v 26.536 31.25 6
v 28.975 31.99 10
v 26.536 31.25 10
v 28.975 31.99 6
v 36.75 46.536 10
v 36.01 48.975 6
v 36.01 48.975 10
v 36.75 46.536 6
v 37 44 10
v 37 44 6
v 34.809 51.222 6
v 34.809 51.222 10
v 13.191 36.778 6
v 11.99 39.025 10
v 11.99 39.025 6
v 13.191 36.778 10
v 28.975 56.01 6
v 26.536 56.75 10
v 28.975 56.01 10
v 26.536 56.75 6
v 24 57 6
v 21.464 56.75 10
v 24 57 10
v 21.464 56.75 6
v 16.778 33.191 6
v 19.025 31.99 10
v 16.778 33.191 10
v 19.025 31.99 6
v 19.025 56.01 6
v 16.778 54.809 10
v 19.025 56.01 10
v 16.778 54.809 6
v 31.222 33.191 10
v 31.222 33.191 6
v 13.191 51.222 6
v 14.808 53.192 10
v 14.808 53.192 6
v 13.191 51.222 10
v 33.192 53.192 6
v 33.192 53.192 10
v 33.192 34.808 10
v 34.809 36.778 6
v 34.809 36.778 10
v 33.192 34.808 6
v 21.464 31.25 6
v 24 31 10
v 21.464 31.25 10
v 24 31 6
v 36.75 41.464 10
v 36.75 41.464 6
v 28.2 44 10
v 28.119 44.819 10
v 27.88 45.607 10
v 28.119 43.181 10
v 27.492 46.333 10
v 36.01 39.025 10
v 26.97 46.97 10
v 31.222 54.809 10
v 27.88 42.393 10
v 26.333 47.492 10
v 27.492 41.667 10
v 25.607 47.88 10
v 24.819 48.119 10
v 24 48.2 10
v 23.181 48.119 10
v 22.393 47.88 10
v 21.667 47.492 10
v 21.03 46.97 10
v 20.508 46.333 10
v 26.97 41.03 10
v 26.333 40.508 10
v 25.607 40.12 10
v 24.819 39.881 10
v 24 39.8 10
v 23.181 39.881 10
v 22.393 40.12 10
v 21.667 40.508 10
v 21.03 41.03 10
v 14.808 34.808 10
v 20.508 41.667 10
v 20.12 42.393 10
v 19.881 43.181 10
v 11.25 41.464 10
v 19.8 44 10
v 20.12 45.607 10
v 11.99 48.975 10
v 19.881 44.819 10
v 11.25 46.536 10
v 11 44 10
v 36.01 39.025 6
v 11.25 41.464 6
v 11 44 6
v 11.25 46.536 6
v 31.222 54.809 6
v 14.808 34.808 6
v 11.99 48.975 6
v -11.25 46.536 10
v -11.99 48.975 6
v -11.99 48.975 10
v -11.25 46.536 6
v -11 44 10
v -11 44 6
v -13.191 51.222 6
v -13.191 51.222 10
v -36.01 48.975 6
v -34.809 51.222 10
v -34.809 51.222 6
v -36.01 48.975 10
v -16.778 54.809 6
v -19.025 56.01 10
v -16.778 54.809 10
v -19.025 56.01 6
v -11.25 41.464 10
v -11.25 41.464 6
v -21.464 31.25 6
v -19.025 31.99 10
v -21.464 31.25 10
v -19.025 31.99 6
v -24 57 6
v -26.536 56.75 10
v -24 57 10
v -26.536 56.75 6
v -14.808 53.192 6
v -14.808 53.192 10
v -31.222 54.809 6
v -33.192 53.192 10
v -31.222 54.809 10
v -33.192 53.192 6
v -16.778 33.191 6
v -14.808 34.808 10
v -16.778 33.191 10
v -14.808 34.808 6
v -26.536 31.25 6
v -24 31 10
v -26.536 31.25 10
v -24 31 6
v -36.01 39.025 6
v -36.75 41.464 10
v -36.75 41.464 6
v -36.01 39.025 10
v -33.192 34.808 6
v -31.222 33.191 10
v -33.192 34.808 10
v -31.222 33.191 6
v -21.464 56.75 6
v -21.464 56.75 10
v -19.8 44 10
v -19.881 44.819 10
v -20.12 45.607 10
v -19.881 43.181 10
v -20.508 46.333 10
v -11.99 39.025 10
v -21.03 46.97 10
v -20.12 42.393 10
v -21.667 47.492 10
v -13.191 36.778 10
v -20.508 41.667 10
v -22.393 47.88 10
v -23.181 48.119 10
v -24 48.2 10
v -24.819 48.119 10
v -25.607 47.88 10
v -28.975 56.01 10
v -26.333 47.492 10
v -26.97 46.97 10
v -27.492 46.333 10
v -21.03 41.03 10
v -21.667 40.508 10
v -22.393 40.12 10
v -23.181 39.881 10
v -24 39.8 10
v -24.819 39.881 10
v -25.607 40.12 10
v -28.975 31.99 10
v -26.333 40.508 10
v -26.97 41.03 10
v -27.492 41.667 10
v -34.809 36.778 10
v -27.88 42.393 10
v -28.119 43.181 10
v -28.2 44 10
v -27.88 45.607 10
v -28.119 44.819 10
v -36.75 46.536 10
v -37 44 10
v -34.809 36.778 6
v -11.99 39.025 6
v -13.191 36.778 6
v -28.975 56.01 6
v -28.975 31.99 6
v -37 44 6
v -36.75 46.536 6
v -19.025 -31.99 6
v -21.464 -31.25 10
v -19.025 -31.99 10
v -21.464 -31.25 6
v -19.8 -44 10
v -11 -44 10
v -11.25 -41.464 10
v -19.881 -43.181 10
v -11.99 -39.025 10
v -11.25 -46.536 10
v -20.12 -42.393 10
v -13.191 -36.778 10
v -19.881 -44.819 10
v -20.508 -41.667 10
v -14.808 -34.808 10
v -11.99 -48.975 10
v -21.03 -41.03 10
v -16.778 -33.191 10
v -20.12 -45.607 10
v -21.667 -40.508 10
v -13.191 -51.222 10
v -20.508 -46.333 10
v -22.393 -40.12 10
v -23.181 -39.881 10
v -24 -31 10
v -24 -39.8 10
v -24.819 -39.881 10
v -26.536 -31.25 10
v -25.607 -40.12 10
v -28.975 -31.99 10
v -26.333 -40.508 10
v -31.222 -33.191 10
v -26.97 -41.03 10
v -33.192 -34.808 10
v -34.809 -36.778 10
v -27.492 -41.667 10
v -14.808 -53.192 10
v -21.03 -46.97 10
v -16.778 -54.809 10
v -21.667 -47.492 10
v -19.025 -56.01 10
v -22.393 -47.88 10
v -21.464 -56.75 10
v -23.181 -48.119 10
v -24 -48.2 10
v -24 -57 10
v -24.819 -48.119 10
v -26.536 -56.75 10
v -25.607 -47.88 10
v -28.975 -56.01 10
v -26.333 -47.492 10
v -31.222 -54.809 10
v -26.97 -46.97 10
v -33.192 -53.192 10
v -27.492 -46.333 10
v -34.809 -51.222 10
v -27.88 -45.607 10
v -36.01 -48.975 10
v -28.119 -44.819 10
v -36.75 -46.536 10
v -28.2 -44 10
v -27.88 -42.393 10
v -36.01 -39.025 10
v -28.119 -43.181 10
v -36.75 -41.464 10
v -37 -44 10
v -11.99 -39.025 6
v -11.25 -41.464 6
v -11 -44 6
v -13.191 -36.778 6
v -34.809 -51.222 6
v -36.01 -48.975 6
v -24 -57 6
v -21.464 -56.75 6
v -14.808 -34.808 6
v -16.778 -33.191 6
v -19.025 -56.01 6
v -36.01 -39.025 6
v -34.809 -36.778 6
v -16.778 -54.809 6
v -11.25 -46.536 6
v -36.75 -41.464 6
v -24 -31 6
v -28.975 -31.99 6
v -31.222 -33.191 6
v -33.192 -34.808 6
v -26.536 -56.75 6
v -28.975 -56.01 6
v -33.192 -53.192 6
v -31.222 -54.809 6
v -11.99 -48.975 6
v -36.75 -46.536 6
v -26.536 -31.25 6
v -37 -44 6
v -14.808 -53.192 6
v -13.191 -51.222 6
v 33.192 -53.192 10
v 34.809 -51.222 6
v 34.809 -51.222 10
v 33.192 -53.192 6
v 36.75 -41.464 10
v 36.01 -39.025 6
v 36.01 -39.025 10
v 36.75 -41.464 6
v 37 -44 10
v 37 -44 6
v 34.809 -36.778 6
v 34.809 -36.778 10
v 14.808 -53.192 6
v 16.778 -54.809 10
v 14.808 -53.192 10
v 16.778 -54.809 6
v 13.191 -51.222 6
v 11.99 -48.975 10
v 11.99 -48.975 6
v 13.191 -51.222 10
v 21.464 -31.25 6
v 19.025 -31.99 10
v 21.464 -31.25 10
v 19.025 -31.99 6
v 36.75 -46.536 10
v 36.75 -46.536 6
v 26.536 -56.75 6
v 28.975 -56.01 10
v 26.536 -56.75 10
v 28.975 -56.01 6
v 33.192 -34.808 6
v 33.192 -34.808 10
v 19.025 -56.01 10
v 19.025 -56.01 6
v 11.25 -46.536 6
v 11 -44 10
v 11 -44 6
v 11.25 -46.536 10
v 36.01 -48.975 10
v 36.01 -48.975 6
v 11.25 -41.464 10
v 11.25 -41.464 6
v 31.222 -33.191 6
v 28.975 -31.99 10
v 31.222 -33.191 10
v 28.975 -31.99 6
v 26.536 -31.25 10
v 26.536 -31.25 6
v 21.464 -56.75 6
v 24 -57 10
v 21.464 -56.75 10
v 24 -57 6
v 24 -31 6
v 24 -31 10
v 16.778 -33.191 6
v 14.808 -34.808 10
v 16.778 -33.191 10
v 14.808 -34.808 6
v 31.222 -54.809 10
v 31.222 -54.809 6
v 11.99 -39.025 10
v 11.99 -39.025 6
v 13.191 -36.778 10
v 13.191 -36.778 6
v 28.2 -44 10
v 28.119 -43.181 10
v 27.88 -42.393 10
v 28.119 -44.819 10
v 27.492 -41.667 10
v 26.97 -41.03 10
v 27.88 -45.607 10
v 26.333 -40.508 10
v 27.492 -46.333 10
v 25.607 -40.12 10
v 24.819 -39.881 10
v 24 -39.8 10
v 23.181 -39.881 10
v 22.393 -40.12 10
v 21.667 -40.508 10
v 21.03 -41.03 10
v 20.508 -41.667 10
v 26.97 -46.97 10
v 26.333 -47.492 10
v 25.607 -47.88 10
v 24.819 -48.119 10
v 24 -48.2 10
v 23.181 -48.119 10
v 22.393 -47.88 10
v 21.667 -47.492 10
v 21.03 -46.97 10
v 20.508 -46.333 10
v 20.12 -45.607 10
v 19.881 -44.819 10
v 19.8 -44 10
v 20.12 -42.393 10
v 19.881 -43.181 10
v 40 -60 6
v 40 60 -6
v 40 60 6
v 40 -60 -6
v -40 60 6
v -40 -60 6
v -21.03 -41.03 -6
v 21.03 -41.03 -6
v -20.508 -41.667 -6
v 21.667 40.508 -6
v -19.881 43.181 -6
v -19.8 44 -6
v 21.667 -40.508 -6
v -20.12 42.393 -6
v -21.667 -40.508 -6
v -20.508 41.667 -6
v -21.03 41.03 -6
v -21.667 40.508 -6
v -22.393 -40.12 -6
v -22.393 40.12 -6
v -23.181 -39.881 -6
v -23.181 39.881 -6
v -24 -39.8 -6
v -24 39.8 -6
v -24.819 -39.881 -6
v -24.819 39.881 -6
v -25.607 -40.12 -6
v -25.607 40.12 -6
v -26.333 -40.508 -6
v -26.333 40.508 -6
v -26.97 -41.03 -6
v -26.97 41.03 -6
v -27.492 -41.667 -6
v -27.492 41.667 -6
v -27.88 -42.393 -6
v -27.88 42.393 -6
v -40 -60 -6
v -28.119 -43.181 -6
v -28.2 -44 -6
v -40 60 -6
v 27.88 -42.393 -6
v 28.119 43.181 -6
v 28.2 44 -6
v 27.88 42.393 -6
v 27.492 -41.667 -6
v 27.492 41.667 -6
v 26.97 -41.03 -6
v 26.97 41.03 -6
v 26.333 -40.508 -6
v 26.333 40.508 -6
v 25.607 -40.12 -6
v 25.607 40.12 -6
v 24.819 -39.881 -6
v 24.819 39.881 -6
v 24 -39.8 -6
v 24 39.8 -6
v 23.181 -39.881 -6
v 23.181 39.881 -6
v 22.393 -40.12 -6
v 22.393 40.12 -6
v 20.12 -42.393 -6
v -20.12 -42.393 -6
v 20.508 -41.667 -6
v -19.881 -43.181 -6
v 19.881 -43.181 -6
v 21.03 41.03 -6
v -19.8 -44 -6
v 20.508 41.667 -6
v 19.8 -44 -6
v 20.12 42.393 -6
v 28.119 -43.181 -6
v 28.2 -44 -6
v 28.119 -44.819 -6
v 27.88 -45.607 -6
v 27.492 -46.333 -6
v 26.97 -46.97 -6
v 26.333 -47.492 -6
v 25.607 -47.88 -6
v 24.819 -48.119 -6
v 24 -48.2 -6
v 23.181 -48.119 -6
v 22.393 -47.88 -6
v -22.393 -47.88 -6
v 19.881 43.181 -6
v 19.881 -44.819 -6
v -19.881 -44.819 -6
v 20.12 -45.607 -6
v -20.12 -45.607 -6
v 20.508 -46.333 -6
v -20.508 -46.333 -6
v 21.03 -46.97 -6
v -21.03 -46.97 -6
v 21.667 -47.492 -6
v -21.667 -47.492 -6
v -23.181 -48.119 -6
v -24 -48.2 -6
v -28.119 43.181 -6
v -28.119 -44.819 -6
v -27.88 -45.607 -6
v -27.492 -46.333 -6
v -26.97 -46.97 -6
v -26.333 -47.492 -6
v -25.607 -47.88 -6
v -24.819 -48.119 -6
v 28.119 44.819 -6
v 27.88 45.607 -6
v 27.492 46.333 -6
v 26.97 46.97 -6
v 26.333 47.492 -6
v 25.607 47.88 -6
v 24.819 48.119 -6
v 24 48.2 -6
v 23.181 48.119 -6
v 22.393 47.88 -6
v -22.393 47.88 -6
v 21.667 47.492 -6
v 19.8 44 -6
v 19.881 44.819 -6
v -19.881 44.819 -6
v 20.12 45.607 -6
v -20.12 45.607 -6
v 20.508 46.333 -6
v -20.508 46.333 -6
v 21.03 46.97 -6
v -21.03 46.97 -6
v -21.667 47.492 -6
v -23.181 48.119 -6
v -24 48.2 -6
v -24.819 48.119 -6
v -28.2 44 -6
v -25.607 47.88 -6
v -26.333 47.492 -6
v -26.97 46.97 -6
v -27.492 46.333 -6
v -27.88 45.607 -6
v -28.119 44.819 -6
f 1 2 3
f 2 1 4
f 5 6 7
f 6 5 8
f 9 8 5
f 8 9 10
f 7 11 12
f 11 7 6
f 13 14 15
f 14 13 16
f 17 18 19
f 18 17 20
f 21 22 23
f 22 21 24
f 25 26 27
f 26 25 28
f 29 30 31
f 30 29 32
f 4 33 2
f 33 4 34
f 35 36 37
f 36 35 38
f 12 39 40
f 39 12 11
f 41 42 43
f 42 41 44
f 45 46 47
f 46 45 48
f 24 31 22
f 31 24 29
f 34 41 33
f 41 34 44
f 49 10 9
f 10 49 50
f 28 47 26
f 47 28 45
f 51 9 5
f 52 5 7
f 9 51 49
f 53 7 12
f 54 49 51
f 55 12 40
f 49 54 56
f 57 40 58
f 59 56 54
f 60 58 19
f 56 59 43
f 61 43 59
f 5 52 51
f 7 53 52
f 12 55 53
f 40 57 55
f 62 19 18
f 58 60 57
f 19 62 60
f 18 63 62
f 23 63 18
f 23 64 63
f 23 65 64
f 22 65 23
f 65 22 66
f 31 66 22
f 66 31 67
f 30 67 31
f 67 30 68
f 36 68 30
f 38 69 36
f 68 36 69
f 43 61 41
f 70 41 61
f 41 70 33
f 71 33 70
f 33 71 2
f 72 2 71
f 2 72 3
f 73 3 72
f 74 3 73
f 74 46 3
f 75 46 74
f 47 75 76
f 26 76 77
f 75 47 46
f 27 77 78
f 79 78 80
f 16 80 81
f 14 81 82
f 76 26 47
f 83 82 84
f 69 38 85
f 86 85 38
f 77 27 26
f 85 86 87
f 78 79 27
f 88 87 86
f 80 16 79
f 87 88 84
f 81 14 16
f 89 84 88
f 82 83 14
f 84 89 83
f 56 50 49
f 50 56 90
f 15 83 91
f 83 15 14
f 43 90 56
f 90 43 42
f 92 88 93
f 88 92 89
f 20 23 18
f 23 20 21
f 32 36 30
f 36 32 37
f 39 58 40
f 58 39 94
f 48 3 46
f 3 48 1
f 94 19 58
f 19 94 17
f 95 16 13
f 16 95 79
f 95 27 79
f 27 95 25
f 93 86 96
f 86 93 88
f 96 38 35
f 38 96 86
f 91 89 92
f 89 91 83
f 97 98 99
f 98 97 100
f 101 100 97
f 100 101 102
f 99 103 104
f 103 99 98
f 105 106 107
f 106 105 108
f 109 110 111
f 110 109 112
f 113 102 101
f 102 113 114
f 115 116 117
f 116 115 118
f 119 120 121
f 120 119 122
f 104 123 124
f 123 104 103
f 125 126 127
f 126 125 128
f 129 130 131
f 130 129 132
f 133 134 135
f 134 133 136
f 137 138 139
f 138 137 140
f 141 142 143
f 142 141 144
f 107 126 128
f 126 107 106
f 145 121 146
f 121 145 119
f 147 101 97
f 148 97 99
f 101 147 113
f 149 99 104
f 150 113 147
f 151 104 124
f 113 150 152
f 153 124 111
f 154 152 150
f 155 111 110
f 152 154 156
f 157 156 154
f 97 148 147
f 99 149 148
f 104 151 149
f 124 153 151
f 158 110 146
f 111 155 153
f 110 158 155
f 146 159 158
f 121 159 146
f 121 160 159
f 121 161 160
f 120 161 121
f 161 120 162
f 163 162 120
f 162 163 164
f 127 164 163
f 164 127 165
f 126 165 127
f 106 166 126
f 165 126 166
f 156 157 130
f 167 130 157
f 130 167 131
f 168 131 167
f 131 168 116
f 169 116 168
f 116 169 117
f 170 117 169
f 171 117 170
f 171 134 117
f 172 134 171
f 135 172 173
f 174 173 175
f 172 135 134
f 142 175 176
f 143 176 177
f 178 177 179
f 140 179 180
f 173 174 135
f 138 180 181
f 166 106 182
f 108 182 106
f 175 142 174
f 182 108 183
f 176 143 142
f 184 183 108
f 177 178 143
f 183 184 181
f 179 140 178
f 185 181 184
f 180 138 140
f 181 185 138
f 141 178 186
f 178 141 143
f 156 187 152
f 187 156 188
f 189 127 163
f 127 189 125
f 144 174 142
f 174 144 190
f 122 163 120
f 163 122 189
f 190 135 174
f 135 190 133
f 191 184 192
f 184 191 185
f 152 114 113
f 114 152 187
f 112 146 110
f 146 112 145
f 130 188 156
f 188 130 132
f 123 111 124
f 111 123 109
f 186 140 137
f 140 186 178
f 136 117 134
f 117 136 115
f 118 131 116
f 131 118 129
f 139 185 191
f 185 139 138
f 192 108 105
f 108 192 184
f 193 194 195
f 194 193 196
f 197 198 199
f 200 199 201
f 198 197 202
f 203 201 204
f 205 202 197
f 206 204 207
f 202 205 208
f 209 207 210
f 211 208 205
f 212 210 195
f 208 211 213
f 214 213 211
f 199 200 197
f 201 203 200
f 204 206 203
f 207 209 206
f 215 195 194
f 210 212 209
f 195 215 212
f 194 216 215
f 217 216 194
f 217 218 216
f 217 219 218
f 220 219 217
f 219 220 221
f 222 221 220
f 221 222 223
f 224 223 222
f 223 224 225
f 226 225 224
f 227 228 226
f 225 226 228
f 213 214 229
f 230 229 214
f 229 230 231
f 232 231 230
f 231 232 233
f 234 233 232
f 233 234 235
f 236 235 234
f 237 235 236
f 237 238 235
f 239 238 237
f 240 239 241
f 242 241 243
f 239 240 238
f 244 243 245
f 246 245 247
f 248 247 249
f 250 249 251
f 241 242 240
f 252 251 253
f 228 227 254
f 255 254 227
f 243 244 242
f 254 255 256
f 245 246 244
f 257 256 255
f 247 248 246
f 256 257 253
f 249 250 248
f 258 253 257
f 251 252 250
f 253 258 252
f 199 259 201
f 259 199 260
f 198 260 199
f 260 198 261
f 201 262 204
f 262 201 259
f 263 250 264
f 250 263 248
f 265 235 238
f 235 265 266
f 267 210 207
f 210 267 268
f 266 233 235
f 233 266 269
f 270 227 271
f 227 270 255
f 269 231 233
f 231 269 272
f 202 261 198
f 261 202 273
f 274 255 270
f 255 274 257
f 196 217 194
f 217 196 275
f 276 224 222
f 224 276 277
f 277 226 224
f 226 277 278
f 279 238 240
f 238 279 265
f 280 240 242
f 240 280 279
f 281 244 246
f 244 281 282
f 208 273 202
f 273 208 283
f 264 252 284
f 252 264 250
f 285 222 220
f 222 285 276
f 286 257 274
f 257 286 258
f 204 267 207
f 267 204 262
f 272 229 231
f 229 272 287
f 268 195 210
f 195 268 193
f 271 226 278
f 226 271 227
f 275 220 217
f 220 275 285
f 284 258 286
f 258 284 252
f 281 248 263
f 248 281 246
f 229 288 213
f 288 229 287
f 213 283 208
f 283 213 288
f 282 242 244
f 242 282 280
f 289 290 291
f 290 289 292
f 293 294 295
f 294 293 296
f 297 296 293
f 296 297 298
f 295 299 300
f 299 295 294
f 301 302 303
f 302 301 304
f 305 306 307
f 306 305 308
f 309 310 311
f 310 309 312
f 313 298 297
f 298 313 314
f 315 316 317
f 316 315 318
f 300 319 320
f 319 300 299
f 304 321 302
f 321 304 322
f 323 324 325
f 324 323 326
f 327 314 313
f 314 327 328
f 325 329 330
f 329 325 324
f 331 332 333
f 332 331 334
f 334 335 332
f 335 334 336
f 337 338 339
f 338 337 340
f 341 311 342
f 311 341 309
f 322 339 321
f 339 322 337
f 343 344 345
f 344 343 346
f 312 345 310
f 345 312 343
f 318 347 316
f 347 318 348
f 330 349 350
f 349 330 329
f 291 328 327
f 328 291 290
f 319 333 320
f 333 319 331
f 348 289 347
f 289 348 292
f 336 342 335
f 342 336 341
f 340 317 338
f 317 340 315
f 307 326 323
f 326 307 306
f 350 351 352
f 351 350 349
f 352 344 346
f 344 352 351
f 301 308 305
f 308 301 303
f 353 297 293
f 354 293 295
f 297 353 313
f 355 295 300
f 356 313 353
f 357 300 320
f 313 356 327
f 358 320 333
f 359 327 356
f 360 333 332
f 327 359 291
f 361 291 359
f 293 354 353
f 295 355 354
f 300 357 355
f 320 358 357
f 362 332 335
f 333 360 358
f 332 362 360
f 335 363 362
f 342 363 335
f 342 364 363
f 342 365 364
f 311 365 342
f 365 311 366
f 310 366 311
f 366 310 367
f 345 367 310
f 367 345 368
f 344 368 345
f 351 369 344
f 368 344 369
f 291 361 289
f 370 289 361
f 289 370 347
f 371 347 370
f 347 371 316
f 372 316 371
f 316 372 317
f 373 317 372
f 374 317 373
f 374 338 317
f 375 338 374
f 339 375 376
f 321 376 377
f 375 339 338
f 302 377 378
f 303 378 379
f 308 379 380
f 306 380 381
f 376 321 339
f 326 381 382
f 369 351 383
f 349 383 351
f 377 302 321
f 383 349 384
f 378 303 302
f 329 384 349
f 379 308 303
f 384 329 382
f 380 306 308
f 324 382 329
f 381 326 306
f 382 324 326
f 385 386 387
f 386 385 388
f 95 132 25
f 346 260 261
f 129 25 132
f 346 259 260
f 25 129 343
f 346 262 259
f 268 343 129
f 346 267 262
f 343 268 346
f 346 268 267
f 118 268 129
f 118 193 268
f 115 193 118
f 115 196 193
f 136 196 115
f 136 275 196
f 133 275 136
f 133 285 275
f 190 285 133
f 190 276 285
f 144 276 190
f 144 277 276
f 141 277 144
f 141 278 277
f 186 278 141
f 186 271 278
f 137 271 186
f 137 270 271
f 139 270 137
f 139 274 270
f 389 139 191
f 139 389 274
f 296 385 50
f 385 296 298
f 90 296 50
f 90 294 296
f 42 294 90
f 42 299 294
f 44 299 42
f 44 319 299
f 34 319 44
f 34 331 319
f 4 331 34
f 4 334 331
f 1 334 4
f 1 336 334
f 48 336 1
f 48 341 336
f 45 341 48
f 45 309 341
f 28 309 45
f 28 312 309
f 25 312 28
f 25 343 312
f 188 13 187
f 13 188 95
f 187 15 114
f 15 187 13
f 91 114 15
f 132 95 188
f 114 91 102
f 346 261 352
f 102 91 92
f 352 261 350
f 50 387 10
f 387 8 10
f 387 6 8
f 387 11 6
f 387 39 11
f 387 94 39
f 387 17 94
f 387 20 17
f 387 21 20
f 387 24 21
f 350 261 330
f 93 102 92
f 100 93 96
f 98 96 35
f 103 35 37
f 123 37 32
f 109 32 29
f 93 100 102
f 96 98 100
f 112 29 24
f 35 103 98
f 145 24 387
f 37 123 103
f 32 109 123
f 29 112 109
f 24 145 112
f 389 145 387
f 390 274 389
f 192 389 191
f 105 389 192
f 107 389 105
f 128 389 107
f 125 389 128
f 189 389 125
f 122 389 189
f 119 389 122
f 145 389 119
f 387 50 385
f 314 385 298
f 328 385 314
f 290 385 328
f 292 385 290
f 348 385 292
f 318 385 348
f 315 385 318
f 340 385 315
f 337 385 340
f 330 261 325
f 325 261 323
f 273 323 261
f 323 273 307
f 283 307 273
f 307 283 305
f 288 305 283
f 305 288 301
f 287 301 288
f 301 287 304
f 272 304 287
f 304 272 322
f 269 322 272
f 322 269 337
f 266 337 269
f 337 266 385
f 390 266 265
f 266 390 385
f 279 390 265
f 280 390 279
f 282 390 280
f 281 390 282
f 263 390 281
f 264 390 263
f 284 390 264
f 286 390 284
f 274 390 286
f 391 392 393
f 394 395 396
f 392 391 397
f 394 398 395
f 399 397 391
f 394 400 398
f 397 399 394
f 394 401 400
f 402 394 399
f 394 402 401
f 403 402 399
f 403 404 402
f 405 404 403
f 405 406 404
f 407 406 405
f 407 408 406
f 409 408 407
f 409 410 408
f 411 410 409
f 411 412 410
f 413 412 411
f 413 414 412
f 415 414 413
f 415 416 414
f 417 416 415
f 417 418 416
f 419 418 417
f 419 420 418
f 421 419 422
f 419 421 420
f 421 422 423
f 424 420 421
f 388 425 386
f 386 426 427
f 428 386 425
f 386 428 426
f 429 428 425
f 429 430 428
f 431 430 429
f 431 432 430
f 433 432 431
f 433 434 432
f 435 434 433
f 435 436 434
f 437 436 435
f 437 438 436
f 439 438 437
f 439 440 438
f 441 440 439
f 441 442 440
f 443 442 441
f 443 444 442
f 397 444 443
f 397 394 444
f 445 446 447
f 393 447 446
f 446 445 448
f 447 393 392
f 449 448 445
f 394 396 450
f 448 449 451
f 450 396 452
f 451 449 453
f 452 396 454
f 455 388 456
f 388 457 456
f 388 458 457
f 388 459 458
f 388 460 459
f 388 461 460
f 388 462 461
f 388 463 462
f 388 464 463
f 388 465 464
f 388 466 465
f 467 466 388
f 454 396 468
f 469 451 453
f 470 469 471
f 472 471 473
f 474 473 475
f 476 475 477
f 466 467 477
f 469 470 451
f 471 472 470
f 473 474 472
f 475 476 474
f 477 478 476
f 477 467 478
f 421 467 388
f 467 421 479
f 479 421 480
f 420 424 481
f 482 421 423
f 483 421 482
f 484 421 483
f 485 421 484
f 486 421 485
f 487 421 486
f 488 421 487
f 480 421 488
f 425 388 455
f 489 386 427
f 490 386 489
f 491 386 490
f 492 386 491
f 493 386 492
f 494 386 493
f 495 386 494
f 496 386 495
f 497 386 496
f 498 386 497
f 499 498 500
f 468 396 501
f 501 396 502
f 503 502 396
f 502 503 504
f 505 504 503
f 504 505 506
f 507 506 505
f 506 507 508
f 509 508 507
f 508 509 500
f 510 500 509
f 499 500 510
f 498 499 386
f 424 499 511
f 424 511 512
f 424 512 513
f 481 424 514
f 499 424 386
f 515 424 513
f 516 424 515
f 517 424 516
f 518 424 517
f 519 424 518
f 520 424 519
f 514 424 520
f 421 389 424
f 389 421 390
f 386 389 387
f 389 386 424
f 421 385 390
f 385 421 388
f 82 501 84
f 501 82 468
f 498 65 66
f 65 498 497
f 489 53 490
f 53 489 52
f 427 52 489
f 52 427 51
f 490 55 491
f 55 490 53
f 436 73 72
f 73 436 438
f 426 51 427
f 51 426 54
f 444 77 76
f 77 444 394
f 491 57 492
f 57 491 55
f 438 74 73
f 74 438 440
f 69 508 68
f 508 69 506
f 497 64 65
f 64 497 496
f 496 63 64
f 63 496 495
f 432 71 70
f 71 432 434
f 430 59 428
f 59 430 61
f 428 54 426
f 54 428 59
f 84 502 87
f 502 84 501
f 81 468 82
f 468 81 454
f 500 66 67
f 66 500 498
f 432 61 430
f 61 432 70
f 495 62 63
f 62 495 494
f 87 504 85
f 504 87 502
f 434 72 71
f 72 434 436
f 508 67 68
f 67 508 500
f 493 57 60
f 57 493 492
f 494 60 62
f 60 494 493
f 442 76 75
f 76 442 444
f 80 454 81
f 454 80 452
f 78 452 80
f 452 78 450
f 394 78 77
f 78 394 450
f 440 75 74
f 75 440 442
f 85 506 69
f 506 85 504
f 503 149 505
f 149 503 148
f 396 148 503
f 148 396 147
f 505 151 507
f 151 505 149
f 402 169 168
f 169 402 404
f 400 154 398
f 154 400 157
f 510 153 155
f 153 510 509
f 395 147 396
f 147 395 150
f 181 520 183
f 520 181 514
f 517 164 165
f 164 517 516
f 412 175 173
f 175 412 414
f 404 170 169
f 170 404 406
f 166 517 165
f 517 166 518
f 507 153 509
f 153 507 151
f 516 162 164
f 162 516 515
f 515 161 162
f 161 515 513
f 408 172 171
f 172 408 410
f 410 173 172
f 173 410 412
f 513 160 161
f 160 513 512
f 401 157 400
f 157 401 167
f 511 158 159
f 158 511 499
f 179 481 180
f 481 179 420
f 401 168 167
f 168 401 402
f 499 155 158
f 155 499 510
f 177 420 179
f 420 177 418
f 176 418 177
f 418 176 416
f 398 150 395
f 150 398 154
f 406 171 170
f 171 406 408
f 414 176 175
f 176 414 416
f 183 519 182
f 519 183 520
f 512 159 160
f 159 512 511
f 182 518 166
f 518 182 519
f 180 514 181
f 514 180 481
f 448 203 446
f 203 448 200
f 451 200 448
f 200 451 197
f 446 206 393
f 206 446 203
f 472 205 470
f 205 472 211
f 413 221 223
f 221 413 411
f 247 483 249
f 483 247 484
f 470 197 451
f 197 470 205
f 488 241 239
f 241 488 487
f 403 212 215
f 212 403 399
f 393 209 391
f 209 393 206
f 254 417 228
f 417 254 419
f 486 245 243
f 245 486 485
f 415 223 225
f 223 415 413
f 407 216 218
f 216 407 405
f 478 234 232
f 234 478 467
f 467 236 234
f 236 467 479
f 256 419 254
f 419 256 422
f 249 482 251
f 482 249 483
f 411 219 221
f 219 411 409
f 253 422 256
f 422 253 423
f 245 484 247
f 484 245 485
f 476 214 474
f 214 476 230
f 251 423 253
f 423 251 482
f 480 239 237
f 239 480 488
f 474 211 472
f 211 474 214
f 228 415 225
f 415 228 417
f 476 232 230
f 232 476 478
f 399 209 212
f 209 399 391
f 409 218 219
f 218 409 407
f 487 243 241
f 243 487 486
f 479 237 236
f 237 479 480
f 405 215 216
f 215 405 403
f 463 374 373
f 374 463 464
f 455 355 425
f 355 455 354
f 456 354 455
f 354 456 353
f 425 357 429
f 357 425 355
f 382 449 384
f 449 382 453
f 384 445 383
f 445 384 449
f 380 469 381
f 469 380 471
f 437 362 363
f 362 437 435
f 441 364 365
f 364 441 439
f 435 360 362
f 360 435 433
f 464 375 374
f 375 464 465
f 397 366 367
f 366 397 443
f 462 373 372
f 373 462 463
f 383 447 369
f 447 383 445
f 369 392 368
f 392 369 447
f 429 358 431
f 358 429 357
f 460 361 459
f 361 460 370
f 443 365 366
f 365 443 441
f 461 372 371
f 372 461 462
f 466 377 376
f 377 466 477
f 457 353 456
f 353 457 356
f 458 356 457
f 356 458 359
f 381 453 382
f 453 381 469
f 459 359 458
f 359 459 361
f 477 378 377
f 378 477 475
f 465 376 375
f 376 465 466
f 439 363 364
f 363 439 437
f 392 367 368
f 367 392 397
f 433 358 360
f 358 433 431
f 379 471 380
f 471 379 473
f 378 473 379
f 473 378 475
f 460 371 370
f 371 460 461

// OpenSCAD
$fn = 32;

// ----------------------------------------------------------------------
// Anchor pads 80 x 120 x 16
// four corner bosses with anchor holes
// ----------------------------------------------------------------------

// --- parameters (mm) ---
plate = [80, 120, 12];  // base plate size (x, y, z)
pads = 4;               // boss count, one per corner
edge = 16;              // boss centre offset from the plate edge
boss_d = 26;            // boss diameter
boss_h = 4;             // boss height above the base plate
hole_d = 8.4;           // hole diameter

// --- derived feature positions (mm) ---
height = plate[2] + boss_h;      // = 16   overall height of the part
corner_x = plate[0] / 2 - edge;  // = 24   boss centre X
corner_y = plate[1] / 2 - edge;  // = 44   boss centre Y
feature_centers = [
  [corner_x, corner_y],
  [-corner_x, corner_y],
  [-corner_x, -corner_y],
  [corner_x, -corner_y]
];   // boss centres, anchor holes are drilled there

// base plate, four bosses standing on it, anchor holes all the way through
difference() {
  union() {
    cube(plate, center = true);
    for (centre = feature_centers)
      translate([centre[0], centre[1], plate[2] / 2 - 1])
        cylinder(d = boss_d, h = boss_h + 1);
  }
  for (centre = feature_centers)
    translate([centre[0], centre[1], -height])
      cylinder(d = hole_d, h = 2 * height + 2);  // through boss and plate
}
